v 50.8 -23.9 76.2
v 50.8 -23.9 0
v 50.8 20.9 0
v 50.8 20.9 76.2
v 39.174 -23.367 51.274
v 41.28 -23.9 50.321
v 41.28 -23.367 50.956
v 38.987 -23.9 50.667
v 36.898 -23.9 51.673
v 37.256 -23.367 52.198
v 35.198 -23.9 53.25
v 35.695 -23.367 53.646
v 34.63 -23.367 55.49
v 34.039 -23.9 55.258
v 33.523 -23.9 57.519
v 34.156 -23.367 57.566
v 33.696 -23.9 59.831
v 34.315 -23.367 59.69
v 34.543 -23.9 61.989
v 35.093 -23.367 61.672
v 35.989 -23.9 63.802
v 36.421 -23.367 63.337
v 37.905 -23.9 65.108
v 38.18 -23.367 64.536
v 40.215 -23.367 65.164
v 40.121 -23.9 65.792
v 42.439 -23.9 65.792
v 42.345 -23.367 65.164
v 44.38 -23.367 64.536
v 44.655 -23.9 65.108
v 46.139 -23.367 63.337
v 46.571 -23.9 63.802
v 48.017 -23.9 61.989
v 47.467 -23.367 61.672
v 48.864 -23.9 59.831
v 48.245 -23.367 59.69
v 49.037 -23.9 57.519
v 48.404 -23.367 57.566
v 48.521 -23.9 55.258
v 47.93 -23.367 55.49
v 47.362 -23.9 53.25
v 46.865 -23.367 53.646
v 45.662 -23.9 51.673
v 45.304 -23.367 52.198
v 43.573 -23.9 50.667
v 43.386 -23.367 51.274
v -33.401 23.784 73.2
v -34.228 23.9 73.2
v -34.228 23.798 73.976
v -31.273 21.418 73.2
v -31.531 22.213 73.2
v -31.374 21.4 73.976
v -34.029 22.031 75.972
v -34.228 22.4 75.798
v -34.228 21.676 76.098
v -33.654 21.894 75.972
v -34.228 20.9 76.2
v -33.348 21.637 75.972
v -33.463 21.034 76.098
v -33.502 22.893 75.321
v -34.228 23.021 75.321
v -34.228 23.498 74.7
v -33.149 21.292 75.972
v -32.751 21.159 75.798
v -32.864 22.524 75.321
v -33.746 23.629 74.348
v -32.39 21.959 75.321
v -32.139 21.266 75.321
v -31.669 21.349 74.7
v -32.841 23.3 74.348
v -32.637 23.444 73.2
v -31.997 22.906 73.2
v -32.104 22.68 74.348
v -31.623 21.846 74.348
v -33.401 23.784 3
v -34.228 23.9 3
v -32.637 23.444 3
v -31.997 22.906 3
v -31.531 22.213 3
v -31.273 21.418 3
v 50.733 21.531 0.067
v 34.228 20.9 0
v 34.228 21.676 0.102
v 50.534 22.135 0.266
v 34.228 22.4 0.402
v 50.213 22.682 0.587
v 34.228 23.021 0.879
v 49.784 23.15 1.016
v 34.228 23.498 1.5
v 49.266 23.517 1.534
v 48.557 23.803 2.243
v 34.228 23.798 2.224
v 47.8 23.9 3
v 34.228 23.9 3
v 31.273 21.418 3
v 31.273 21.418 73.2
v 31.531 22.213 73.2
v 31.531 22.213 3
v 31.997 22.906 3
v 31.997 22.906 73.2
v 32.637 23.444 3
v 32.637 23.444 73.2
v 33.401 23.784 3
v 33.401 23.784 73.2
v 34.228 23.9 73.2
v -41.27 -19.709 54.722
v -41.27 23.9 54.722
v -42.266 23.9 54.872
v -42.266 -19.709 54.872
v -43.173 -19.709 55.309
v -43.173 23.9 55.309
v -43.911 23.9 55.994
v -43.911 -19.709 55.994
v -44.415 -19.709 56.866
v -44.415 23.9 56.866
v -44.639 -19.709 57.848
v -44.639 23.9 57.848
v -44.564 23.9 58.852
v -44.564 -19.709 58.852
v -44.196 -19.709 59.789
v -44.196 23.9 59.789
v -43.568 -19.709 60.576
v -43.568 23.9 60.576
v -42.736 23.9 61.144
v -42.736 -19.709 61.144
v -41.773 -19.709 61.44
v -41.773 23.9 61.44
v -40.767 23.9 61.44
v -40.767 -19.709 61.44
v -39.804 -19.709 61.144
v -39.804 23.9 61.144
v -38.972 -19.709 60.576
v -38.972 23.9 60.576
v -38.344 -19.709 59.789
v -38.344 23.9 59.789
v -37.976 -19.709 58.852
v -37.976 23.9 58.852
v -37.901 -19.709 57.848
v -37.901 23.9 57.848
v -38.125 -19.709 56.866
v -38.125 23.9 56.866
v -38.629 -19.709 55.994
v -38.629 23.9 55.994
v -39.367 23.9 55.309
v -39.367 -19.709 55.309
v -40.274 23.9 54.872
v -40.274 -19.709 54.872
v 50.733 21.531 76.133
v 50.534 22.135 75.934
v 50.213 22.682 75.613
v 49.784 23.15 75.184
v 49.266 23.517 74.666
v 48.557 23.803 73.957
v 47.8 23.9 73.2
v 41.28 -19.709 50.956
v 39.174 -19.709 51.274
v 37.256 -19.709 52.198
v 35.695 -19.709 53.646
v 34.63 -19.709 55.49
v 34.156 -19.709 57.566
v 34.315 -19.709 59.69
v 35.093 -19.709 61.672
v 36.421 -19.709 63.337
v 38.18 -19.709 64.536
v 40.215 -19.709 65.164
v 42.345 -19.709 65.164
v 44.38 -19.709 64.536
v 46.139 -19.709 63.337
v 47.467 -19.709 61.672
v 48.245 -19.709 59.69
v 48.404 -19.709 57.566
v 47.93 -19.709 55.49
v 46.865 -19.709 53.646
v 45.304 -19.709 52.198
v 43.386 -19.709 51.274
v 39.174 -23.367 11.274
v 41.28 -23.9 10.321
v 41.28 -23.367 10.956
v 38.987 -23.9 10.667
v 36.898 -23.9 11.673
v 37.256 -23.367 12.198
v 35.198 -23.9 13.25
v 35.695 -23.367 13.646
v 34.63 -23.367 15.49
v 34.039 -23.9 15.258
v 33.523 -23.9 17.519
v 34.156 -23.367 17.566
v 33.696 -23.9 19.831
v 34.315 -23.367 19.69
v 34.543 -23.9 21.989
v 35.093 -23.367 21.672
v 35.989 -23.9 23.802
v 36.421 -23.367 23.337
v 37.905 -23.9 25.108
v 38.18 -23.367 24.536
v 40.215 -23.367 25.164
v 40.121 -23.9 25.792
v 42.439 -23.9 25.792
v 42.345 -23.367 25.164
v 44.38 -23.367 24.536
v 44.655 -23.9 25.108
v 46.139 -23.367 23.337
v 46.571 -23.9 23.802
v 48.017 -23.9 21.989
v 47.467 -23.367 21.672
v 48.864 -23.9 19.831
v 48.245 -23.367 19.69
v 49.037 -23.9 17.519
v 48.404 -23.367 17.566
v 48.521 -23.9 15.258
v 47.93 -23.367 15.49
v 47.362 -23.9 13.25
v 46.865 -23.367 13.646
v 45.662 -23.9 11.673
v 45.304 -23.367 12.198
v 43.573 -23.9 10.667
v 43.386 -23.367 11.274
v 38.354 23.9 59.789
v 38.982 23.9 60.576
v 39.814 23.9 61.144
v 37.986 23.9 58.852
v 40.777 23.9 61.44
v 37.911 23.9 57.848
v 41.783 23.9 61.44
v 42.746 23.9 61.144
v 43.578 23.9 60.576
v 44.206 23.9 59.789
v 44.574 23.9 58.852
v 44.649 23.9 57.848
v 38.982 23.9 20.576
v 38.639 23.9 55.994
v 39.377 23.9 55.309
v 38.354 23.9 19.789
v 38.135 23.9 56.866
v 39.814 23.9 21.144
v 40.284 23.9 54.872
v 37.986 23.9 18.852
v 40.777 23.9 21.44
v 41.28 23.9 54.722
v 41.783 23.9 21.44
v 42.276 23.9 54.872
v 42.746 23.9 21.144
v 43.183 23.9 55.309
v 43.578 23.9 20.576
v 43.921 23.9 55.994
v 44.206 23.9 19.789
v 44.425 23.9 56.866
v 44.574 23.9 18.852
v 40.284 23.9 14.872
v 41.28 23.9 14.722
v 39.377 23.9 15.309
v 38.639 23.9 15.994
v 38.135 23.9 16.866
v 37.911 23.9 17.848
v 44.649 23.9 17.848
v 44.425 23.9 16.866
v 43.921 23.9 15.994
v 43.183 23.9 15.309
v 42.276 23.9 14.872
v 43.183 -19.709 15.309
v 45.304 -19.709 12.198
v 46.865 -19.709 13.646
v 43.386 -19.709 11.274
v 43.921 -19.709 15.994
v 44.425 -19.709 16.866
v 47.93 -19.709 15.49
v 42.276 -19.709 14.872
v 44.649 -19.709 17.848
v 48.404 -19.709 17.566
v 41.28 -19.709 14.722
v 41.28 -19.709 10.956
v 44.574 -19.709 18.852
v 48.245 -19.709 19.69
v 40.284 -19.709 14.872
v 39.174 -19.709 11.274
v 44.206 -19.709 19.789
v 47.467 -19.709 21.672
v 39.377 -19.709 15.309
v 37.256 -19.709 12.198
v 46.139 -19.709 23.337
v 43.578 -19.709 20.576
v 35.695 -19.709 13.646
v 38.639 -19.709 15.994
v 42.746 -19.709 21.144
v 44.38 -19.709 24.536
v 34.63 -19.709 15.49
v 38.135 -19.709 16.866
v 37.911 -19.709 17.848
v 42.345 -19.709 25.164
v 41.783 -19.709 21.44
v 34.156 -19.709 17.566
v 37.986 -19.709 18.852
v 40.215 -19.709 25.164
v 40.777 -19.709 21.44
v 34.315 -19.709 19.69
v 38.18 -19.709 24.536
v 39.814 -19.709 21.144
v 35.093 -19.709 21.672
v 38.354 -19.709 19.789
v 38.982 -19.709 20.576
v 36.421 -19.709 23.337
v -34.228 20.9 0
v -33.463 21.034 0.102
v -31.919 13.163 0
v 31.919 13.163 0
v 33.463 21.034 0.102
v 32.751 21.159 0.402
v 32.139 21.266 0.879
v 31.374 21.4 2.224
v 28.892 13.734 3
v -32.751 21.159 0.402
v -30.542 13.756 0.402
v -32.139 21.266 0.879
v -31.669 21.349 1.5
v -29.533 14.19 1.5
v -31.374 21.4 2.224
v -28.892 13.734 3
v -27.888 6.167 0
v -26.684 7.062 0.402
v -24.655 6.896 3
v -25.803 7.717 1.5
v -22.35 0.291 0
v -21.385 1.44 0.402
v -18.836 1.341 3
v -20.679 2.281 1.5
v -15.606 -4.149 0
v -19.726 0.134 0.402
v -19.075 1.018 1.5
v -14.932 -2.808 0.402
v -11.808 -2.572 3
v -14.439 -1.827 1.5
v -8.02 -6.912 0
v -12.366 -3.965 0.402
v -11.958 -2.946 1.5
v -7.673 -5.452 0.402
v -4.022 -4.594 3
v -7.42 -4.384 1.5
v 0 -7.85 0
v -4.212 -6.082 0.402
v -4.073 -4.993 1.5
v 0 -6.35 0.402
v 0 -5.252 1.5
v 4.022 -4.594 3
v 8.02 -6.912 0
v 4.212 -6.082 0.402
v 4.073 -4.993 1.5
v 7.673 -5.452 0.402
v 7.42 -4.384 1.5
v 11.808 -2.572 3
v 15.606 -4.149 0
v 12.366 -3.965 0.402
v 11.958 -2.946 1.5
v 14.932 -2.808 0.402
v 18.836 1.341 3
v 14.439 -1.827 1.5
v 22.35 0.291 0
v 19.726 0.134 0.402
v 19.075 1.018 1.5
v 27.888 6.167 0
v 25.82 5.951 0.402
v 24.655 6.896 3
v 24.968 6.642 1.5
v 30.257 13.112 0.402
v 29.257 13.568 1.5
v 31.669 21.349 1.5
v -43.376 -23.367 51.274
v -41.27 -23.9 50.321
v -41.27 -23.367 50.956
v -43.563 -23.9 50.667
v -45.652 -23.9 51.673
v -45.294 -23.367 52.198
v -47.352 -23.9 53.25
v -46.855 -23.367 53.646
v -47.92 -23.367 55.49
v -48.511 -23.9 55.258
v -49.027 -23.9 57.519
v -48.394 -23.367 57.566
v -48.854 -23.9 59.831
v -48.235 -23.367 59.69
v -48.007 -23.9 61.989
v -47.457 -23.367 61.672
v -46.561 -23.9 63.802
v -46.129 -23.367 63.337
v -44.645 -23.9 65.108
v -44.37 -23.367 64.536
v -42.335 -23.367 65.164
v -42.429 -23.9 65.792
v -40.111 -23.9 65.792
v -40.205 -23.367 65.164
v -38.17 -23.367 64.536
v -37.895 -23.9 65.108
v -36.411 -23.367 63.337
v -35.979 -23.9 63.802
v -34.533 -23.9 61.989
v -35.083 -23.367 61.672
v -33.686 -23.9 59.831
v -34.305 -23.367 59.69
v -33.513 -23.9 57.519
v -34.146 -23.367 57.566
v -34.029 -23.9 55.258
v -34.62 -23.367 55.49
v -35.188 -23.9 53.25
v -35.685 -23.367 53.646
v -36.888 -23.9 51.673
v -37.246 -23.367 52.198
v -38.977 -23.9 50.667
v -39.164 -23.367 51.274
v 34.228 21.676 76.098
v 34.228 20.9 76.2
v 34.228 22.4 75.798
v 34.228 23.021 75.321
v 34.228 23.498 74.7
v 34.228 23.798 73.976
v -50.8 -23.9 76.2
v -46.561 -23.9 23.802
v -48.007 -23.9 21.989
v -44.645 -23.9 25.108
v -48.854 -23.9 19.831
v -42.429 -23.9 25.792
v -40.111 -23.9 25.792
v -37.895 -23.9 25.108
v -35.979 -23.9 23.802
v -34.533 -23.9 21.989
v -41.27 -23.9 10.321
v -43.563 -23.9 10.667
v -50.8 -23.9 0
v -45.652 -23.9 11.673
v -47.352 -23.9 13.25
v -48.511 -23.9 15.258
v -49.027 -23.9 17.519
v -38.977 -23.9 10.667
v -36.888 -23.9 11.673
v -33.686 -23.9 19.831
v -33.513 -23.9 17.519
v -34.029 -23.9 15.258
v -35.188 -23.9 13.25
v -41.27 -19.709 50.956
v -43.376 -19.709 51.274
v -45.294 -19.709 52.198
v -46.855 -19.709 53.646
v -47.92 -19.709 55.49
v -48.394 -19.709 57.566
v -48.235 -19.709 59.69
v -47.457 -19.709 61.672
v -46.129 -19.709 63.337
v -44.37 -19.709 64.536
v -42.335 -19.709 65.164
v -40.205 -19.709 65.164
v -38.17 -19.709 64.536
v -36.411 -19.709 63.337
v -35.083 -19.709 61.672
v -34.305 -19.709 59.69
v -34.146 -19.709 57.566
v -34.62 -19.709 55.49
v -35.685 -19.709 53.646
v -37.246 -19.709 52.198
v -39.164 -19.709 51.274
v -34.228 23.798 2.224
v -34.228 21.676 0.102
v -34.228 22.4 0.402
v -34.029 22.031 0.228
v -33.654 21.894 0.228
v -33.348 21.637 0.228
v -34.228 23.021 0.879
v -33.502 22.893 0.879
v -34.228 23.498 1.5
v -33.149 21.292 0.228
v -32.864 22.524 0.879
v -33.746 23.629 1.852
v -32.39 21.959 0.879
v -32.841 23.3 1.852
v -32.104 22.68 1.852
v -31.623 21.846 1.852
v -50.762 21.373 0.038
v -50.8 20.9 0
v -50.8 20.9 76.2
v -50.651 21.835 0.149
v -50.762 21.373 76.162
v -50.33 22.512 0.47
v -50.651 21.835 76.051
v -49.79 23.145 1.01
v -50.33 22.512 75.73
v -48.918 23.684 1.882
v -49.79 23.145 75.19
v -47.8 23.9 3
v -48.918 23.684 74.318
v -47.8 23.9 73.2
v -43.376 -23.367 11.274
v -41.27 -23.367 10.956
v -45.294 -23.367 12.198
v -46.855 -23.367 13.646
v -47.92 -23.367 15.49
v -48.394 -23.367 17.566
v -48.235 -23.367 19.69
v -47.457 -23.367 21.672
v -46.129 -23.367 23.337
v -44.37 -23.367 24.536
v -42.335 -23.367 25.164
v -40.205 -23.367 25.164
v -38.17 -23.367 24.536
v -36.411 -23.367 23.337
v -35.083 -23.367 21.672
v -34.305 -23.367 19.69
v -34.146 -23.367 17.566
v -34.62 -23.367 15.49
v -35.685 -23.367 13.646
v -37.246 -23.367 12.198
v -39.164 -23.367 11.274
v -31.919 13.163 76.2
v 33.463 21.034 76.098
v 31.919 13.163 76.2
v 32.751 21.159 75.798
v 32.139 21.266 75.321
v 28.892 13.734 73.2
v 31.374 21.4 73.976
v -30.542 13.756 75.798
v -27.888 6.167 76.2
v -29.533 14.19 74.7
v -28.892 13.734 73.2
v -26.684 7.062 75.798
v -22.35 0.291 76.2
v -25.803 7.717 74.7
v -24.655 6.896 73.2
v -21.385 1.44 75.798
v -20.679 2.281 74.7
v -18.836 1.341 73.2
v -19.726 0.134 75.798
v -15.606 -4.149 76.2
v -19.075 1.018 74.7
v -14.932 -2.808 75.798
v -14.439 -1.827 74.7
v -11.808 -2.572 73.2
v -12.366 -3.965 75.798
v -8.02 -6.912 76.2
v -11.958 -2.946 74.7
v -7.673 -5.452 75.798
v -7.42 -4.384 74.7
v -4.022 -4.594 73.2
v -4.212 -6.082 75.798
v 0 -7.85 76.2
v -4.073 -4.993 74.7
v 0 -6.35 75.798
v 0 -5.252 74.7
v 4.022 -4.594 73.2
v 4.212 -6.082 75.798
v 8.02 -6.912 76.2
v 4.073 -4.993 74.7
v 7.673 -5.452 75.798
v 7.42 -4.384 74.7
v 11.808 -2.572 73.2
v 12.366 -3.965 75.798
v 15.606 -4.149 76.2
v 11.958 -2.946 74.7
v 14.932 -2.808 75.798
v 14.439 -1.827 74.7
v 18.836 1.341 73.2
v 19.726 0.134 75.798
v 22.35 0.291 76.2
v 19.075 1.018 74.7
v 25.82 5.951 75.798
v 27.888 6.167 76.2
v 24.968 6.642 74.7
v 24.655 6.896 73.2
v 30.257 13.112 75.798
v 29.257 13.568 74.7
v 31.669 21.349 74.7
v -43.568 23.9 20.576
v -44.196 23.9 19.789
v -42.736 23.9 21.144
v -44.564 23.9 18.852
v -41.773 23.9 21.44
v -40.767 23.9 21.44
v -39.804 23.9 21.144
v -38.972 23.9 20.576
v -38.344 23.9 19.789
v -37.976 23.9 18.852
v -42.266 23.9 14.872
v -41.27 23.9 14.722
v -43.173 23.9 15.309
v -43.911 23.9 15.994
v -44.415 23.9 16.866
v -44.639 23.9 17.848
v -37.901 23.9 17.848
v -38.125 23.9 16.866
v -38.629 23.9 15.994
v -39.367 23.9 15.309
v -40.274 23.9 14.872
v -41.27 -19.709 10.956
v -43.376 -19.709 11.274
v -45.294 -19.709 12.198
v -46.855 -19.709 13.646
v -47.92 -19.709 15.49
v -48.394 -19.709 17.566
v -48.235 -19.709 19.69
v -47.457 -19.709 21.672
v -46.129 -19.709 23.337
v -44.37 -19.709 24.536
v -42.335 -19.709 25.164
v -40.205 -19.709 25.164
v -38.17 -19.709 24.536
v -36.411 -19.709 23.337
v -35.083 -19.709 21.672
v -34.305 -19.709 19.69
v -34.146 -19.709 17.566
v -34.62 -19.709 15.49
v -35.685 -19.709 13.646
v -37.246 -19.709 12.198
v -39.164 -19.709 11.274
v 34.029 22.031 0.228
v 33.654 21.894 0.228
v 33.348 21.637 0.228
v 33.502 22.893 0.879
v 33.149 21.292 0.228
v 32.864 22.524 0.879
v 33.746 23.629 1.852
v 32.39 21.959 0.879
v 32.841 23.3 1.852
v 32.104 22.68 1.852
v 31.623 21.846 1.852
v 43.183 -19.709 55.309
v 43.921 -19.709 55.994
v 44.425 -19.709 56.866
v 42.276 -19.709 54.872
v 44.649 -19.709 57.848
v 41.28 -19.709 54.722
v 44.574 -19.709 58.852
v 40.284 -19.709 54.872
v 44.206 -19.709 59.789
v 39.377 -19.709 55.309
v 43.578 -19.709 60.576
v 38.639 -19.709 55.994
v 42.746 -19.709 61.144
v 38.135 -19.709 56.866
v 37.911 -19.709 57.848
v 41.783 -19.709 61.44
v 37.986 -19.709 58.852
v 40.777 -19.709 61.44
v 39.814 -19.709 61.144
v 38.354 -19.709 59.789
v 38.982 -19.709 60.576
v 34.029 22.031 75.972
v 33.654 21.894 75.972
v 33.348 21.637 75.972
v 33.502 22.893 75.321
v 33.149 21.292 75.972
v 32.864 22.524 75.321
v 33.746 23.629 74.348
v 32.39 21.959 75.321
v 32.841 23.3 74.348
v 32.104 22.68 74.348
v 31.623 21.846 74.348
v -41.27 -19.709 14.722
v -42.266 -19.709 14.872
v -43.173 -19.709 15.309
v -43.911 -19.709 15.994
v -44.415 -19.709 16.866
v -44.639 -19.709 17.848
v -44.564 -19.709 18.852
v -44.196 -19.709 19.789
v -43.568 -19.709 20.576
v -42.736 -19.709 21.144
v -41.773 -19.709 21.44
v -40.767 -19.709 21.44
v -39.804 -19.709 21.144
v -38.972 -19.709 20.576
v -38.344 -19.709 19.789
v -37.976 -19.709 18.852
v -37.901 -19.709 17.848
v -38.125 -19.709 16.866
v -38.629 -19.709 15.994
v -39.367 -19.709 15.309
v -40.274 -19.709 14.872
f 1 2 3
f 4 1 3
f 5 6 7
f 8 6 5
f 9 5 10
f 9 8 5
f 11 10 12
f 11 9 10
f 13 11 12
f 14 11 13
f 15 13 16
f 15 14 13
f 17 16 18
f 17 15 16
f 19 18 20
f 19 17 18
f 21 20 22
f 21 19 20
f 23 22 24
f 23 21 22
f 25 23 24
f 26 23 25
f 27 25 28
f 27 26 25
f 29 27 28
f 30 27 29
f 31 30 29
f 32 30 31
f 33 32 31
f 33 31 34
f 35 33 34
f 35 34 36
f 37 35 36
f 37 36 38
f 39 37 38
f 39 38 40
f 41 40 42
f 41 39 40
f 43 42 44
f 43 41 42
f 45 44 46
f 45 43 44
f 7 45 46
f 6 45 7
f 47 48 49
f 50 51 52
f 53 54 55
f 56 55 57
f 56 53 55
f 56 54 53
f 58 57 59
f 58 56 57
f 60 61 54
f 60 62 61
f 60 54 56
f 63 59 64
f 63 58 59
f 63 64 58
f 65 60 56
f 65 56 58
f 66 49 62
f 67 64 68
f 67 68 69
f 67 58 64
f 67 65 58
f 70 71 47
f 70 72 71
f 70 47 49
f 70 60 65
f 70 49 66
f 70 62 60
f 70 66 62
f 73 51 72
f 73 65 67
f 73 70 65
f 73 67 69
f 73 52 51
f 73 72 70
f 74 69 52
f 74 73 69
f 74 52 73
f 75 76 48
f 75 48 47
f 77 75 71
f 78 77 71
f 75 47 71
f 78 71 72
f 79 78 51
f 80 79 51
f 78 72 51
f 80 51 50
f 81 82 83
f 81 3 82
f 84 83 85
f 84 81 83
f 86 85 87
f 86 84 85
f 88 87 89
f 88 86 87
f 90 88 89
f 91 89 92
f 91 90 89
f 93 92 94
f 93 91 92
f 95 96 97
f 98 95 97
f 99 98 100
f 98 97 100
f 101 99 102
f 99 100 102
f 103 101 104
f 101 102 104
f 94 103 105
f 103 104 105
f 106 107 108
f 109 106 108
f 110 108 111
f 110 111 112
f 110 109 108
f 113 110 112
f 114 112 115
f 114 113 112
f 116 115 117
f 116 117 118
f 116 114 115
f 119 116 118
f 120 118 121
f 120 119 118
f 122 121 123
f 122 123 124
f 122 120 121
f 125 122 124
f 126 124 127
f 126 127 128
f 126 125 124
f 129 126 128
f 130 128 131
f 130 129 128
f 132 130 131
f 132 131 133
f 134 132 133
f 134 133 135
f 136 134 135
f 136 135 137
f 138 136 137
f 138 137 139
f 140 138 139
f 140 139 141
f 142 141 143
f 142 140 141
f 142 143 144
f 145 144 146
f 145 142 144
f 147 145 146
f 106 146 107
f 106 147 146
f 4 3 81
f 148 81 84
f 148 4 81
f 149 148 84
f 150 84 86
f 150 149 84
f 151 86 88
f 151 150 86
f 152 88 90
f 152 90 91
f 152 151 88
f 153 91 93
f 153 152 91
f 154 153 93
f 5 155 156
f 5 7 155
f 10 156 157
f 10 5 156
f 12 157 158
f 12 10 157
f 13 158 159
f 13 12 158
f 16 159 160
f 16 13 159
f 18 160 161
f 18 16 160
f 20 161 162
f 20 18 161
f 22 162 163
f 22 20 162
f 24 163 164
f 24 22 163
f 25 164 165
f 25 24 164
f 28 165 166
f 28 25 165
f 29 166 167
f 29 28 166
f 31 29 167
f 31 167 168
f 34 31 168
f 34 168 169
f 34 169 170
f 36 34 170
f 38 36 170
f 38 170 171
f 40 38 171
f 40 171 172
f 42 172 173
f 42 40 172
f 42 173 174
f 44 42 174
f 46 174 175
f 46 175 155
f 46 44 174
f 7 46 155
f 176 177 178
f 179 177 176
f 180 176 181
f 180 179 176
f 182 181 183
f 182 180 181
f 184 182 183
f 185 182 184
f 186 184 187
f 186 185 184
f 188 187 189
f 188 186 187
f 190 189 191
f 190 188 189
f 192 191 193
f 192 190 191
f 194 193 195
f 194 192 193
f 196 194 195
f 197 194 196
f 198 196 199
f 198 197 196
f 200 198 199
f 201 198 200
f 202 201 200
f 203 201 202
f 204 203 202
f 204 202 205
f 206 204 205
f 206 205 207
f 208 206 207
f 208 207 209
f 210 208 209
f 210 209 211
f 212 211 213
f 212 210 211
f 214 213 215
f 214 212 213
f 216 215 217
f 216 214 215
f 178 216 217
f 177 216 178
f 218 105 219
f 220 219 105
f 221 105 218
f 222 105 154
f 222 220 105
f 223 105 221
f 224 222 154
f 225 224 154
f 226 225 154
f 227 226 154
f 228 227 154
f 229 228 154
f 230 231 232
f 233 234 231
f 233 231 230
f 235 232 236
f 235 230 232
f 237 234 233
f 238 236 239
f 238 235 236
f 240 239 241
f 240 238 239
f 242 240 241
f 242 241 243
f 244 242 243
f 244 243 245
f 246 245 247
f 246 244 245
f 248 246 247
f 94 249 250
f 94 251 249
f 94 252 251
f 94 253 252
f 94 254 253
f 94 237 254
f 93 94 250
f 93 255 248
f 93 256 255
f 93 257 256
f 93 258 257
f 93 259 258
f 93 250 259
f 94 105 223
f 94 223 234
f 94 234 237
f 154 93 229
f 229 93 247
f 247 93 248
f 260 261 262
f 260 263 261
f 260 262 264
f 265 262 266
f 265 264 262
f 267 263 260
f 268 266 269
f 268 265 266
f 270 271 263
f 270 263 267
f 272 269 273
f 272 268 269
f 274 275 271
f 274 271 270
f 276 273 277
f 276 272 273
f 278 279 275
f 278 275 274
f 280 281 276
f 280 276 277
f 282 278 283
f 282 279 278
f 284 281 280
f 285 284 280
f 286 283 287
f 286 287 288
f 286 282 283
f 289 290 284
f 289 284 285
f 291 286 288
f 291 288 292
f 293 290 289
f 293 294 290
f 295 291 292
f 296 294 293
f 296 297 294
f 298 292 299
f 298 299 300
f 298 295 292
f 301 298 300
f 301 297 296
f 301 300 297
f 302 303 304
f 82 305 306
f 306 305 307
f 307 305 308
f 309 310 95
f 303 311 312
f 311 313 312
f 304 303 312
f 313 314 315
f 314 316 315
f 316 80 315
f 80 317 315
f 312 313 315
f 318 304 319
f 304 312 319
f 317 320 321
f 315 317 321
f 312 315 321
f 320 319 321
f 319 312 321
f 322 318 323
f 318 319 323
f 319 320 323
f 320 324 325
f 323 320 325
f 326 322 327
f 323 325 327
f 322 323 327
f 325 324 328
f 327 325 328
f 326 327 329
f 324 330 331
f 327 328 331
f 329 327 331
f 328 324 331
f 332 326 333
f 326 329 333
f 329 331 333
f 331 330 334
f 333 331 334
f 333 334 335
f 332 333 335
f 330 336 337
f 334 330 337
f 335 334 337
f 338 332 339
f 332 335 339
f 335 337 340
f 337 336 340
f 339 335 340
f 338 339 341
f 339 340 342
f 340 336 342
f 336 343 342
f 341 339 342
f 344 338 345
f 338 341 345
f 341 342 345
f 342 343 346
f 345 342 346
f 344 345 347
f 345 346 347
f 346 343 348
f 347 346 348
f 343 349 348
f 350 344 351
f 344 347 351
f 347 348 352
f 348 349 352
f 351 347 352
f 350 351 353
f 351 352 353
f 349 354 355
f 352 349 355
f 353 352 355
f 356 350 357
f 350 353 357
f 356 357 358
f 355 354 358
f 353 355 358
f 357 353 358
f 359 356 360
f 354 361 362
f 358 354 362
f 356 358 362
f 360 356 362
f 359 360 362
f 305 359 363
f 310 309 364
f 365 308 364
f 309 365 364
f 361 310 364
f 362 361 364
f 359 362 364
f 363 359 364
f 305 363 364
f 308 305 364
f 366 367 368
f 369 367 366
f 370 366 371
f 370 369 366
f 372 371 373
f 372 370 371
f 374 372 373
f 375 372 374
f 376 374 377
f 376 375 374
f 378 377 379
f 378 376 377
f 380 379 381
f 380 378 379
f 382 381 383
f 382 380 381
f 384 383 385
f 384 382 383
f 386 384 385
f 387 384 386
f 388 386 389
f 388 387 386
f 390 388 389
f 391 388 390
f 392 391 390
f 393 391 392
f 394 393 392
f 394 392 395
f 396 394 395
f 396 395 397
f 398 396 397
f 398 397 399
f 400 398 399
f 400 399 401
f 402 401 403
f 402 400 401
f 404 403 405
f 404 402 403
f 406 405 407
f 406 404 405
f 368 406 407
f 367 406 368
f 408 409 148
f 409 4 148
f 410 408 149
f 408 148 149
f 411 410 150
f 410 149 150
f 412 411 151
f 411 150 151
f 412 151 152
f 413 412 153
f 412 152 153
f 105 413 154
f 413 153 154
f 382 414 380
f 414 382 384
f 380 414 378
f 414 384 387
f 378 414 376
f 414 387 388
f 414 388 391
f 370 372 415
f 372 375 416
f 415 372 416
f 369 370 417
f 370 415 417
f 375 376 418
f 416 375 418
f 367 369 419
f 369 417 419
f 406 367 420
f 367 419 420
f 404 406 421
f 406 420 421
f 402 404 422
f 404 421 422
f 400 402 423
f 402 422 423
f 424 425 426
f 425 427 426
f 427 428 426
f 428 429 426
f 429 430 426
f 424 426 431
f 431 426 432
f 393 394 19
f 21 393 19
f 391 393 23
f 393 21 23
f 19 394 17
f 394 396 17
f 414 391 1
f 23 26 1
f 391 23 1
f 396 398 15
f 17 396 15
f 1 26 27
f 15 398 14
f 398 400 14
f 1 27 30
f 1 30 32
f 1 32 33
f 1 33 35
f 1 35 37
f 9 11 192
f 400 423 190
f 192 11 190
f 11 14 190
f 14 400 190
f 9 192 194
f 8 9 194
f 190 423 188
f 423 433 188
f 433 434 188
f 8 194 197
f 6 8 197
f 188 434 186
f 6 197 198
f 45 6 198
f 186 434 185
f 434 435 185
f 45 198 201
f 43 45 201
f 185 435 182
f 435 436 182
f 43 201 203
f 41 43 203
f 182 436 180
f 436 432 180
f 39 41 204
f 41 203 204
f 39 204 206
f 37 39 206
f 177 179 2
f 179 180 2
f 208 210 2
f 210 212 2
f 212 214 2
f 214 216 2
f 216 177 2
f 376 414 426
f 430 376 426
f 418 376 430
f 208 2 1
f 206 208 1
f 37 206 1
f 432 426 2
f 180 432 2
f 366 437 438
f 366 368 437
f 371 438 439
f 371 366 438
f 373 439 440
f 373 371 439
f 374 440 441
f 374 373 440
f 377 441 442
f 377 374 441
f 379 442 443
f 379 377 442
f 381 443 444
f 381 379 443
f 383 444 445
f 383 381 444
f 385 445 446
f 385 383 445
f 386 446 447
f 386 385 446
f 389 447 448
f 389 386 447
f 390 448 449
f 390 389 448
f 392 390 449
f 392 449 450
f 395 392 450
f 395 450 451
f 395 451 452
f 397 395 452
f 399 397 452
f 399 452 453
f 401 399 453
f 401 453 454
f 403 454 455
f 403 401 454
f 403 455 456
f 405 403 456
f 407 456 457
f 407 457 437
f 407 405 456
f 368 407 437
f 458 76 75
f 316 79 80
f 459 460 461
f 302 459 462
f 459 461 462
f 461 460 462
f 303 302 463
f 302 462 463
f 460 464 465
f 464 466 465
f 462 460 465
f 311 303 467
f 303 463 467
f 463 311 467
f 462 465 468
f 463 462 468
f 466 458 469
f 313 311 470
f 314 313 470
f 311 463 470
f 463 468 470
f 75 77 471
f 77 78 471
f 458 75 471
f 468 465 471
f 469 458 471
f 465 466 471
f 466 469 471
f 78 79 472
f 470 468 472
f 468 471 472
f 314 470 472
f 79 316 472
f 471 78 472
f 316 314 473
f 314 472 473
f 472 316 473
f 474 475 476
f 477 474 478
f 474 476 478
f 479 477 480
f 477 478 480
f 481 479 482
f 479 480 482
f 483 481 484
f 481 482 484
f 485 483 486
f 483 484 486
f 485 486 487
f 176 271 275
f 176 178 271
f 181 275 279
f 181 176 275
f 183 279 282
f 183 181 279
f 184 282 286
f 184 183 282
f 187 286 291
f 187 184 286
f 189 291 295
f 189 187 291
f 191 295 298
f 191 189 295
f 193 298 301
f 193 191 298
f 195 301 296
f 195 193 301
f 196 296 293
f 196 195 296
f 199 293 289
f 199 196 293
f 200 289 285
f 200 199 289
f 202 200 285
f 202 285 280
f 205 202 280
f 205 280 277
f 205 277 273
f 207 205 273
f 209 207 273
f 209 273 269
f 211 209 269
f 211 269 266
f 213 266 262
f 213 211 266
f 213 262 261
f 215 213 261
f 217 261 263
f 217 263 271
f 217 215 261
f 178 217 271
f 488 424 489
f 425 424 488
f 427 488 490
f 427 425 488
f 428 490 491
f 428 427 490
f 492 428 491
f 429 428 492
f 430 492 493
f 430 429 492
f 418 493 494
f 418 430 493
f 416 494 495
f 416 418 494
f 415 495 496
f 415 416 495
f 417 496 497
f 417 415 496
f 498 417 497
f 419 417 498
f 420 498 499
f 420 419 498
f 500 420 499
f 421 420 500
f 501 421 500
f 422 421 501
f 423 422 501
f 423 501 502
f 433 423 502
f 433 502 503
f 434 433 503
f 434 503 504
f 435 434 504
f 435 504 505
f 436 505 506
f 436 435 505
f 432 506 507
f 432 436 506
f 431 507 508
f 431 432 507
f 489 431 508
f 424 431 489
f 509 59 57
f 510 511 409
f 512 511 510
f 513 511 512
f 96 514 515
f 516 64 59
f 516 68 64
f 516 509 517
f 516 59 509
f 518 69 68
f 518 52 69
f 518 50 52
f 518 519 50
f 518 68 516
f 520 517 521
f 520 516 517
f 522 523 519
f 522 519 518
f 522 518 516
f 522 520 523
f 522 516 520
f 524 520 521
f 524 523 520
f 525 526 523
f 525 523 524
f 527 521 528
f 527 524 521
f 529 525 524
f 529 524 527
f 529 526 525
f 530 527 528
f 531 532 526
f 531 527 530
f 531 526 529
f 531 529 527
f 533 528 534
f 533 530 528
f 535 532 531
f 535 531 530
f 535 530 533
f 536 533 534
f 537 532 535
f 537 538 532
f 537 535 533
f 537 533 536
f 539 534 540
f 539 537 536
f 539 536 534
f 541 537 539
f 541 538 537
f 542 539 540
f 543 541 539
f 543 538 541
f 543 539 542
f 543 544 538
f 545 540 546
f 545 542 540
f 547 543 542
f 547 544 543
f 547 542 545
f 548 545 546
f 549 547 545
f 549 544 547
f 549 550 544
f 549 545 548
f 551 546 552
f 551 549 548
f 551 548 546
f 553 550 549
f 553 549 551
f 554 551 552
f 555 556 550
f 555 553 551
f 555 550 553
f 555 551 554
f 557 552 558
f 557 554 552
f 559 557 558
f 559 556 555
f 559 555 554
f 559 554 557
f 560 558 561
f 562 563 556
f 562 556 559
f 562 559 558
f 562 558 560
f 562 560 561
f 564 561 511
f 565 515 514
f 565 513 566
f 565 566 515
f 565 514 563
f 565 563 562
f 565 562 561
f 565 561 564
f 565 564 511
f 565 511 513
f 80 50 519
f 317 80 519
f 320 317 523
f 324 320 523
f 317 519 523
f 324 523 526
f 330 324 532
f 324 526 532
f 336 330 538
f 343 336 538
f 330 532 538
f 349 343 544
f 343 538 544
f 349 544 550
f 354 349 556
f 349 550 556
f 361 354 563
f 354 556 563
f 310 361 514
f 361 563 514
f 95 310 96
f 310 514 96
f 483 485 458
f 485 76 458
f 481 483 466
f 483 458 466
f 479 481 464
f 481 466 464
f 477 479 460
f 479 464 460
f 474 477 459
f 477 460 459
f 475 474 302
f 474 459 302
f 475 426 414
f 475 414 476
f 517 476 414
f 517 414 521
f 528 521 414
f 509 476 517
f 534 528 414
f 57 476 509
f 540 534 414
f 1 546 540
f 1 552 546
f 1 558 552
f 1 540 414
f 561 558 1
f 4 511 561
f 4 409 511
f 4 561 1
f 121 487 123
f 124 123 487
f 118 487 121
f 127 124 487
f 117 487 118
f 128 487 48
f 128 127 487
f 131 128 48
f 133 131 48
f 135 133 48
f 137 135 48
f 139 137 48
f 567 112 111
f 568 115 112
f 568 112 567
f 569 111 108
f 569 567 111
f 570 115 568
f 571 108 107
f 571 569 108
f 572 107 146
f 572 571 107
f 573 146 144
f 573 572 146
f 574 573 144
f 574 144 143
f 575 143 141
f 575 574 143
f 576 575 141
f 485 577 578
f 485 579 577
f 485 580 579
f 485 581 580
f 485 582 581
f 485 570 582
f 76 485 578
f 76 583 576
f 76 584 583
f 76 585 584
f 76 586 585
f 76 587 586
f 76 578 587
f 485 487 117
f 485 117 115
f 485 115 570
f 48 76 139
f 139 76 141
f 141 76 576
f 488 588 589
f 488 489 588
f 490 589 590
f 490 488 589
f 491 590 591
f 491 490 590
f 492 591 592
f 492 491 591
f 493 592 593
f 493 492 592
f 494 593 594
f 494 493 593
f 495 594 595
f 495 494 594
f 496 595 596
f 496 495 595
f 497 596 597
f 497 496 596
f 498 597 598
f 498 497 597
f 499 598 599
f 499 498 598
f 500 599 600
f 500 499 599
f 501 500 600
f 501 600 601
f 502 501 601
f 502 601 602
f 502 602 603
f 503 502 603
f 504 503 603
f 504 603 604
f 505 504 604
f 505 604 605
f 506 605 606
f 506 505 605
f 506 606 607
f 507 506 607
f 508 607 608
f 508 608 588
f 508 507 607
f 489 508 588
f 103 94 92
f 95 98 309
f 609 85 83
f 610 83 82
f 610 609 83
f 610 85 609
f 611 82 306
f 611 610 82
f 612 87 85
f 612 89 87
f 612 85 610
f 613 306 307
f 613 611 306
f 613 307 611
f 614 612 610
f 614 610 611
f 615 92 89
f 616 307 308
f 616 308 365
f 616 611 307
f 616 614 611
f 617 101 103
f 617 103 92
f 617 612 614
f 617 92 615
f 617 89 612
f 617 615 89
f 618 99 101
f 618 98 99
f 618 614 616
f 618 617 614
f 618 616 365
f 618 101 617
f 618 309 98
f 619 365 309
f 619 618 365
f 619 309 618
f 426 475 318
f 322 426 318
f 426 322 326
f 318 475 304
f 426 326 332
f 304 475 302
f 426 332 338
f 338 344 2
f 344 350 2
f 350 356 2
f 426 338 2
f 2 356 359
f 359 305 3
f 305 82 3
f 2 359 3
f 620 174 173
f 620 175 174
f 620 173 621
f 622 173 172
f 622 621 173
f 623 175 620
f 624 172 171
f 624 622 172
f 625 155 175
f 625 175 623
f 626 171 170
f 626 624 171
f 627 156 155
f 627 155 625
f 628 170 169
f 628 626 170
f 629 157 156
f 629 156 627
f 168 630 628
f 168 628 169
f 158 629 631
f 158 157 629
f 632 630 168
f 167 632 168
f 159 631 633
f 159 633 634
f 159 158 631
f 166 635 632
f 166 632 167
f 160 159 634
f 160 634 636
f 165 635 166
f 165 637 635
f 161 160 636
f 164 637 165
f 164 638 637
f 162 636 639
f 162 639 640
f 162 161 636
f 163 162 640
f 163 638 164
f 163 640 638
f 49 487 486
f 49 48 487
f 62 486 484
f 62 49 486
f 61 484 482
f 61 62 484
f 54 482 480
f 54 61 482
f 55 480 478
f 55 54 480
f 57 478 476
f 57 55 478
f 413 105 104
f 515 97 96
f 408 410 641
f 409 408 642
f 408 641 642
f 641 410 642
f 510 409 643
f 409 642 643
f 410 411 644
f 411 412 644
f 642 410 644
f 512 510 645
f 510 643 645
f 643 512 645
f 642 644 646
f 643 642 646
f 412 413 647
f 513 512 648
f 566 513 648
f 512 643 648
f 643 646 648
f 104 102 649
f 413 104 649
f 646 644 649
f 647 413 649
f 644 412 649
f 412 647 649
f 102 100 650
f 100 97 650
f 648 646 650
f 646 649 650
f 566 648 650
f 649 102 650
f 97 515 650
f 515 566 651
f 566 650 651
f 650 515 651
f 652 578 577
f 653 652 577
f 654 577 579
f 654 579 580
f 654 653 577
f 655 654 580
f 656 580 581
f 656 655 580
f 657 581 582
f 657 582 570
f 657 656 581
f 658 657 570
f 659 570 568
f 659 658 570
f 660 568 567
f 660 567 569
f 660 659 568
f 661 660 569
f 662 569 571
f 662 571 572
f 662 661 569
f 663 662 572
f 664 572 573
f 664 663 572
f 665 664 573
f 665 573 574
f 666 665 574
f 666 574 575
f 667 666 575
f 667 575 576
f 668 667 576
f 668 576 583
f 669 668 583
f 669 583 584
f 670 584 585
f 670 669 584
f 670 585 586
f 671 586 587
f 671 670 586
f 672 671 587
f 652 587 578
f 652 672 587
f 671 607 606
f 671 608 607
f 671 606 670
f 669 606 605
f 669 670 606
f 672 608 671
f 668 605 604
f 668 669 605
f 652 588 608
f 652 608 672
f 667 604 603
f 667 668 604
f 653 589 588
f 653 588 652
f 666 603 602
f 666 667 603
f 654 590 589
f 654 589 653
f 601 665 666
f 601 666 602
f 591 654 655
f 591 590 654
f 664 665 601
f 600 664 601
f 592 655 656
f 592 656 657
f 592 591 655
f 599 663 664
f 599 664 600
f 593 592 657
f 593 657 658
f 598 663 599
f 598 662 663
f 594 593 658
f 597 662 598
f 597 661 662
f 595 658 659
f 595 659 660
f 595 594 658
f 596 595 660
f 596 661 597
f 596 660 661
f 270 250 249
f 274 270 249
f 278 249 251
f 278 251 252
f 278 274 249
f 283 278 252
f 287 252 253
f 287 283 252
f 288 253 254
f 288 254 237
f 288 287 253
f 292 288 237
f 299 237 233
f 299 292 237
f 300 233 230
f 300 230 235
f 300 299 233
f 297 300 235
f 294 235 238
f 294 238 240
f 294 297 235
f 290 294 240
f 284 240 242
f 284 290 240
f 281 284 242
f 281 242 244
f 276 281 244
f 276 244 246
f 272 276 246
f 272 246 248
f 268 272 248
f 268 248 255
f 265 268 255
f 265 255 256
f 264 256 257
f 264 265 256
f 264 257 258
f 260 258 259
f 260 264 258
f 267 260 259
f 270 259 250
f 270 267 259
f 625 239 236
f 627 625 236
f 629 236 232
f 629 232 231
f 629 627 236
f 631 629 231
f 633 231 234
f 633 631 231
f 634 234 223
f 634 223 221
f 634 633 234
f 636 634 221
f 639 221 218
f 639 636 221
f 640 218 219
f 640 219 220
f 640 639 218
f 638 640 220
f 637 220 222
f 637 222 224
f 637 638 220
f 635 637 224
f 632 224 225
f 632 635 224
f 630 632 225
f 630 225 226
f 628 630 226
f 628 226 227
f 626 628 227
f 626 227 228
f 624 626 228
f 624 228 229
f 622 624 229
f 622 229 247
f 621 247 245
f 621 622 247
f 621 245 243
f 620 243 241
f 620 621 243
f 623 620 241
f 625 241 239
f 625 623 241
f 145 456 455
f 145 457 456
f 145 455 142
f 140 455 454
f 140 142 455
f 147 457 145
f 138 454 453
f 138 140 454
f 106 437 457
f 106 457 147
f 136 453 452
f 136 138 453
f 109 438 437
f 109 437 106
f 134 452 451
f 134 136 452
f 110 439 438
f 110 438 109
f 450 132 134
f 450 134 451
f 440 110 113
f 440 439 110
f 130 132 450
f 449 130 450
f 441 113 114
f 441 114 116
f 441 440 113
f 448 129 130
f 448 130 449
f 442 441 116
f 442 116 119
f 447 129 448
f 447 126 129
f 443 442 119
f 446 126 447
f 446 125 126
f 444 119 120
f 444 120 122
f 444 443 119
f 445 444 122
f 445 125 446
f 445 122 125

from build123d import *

# Parameters (mm, degrees)
SKETCH1_W            = 101.6
SKETCH1_H            = 47.8
BOSS_EXTRUDE1_DEPTH  = 76.2
SKETCH2_R            = 31.75
CUT_EXTRUDE1_DEPTH   = 95.648243512
FILLET1_R            = 3
LPATTERN1_COUNT      = 2
LPATTERN1_PITCH      = 82.55
LPATTERN1_COUNT_DIR2 = 2
LPATTERN1_PITCH_DIR2 = 40


with BuildPart() as part:
    # Sketch1 → Boss-Extrude1 (new body)
    with BuildSketch(Plane.XY):
        Rectangle(SKETCH1_W, SKETCH1_H)
    extrude(amount=BOSS_EXTRUDE1_DEPTH)

    # Sketch2 → Cut-Extrude1 (cut, through all)
    with BuildSketch(Plane.XY.offset(76.2)):
        with Locations((0, 26.9)):
            Circle(SKETCH2_R)
    extrude(amount=-CUT_EXTRUDE1_DEPTH, mode=Mode.SUBTRACT)

    # Fillet1
    fillet1_edges = [part.edges().sort_by_distance(p)[0] for p in [
        (-41.203974975, 23.9, 0),
        (-41.203974975, 23.9, 76.2),
        (0, -4.85, 76.2),
        (0, -4.85, 0),
        (31.607949949, 23.9, 38.1),
        (-31.607949949, 23.9, 38.1),
        (41.203974975, 23.9, 0),
        (-50.8, 23.9, 38.1),
        (50.8, 23.9, 38.1),
        (41.203974975, 23.9, 76.2),
    ]]
    fillet(fillet1_edges, radius=FILLET1_R)

    # Sketch4 → CBORE for 1/4 Binding Head Machine Screw1 (revolve, cut)
    with BuildSketch(Plane(origin=(-41.27, -23.9, 58.1), x_dir=(0, 0, -1), z_dir=(1, 0, 0))):
        Polygon((0, 0), (0, 47.8), (3.3782, 47.8), (3.3782, 4.191), (7.14375, 4.191), (7.14375, 0.532828266), (7.77875, 0), align=None)
    cbore_for_1_4_binding_head_machine_screw = revolve(axis=Axis((-41.27, -30.25, 58.1), (0, 1, 0)), mode=Mode.SUBTRACT)

    # LPattern1: CBORE for 1_4 Binding Head Machine Screw 2 × 2
    with Locations(*[(i * LPATTERN1_PITCH, 0, -j * LPATTERN1_PITCH_DIR2) for i in range(LPATTERN1_COUNT) for j in range(LPATTERN1_COUNT_DIR2) if (i, j) != (0, 0)]):
        add(cbore_for_1_4_binding_head_machine_screw, mode=Mode.SUBTRACT)


solid = part.part
